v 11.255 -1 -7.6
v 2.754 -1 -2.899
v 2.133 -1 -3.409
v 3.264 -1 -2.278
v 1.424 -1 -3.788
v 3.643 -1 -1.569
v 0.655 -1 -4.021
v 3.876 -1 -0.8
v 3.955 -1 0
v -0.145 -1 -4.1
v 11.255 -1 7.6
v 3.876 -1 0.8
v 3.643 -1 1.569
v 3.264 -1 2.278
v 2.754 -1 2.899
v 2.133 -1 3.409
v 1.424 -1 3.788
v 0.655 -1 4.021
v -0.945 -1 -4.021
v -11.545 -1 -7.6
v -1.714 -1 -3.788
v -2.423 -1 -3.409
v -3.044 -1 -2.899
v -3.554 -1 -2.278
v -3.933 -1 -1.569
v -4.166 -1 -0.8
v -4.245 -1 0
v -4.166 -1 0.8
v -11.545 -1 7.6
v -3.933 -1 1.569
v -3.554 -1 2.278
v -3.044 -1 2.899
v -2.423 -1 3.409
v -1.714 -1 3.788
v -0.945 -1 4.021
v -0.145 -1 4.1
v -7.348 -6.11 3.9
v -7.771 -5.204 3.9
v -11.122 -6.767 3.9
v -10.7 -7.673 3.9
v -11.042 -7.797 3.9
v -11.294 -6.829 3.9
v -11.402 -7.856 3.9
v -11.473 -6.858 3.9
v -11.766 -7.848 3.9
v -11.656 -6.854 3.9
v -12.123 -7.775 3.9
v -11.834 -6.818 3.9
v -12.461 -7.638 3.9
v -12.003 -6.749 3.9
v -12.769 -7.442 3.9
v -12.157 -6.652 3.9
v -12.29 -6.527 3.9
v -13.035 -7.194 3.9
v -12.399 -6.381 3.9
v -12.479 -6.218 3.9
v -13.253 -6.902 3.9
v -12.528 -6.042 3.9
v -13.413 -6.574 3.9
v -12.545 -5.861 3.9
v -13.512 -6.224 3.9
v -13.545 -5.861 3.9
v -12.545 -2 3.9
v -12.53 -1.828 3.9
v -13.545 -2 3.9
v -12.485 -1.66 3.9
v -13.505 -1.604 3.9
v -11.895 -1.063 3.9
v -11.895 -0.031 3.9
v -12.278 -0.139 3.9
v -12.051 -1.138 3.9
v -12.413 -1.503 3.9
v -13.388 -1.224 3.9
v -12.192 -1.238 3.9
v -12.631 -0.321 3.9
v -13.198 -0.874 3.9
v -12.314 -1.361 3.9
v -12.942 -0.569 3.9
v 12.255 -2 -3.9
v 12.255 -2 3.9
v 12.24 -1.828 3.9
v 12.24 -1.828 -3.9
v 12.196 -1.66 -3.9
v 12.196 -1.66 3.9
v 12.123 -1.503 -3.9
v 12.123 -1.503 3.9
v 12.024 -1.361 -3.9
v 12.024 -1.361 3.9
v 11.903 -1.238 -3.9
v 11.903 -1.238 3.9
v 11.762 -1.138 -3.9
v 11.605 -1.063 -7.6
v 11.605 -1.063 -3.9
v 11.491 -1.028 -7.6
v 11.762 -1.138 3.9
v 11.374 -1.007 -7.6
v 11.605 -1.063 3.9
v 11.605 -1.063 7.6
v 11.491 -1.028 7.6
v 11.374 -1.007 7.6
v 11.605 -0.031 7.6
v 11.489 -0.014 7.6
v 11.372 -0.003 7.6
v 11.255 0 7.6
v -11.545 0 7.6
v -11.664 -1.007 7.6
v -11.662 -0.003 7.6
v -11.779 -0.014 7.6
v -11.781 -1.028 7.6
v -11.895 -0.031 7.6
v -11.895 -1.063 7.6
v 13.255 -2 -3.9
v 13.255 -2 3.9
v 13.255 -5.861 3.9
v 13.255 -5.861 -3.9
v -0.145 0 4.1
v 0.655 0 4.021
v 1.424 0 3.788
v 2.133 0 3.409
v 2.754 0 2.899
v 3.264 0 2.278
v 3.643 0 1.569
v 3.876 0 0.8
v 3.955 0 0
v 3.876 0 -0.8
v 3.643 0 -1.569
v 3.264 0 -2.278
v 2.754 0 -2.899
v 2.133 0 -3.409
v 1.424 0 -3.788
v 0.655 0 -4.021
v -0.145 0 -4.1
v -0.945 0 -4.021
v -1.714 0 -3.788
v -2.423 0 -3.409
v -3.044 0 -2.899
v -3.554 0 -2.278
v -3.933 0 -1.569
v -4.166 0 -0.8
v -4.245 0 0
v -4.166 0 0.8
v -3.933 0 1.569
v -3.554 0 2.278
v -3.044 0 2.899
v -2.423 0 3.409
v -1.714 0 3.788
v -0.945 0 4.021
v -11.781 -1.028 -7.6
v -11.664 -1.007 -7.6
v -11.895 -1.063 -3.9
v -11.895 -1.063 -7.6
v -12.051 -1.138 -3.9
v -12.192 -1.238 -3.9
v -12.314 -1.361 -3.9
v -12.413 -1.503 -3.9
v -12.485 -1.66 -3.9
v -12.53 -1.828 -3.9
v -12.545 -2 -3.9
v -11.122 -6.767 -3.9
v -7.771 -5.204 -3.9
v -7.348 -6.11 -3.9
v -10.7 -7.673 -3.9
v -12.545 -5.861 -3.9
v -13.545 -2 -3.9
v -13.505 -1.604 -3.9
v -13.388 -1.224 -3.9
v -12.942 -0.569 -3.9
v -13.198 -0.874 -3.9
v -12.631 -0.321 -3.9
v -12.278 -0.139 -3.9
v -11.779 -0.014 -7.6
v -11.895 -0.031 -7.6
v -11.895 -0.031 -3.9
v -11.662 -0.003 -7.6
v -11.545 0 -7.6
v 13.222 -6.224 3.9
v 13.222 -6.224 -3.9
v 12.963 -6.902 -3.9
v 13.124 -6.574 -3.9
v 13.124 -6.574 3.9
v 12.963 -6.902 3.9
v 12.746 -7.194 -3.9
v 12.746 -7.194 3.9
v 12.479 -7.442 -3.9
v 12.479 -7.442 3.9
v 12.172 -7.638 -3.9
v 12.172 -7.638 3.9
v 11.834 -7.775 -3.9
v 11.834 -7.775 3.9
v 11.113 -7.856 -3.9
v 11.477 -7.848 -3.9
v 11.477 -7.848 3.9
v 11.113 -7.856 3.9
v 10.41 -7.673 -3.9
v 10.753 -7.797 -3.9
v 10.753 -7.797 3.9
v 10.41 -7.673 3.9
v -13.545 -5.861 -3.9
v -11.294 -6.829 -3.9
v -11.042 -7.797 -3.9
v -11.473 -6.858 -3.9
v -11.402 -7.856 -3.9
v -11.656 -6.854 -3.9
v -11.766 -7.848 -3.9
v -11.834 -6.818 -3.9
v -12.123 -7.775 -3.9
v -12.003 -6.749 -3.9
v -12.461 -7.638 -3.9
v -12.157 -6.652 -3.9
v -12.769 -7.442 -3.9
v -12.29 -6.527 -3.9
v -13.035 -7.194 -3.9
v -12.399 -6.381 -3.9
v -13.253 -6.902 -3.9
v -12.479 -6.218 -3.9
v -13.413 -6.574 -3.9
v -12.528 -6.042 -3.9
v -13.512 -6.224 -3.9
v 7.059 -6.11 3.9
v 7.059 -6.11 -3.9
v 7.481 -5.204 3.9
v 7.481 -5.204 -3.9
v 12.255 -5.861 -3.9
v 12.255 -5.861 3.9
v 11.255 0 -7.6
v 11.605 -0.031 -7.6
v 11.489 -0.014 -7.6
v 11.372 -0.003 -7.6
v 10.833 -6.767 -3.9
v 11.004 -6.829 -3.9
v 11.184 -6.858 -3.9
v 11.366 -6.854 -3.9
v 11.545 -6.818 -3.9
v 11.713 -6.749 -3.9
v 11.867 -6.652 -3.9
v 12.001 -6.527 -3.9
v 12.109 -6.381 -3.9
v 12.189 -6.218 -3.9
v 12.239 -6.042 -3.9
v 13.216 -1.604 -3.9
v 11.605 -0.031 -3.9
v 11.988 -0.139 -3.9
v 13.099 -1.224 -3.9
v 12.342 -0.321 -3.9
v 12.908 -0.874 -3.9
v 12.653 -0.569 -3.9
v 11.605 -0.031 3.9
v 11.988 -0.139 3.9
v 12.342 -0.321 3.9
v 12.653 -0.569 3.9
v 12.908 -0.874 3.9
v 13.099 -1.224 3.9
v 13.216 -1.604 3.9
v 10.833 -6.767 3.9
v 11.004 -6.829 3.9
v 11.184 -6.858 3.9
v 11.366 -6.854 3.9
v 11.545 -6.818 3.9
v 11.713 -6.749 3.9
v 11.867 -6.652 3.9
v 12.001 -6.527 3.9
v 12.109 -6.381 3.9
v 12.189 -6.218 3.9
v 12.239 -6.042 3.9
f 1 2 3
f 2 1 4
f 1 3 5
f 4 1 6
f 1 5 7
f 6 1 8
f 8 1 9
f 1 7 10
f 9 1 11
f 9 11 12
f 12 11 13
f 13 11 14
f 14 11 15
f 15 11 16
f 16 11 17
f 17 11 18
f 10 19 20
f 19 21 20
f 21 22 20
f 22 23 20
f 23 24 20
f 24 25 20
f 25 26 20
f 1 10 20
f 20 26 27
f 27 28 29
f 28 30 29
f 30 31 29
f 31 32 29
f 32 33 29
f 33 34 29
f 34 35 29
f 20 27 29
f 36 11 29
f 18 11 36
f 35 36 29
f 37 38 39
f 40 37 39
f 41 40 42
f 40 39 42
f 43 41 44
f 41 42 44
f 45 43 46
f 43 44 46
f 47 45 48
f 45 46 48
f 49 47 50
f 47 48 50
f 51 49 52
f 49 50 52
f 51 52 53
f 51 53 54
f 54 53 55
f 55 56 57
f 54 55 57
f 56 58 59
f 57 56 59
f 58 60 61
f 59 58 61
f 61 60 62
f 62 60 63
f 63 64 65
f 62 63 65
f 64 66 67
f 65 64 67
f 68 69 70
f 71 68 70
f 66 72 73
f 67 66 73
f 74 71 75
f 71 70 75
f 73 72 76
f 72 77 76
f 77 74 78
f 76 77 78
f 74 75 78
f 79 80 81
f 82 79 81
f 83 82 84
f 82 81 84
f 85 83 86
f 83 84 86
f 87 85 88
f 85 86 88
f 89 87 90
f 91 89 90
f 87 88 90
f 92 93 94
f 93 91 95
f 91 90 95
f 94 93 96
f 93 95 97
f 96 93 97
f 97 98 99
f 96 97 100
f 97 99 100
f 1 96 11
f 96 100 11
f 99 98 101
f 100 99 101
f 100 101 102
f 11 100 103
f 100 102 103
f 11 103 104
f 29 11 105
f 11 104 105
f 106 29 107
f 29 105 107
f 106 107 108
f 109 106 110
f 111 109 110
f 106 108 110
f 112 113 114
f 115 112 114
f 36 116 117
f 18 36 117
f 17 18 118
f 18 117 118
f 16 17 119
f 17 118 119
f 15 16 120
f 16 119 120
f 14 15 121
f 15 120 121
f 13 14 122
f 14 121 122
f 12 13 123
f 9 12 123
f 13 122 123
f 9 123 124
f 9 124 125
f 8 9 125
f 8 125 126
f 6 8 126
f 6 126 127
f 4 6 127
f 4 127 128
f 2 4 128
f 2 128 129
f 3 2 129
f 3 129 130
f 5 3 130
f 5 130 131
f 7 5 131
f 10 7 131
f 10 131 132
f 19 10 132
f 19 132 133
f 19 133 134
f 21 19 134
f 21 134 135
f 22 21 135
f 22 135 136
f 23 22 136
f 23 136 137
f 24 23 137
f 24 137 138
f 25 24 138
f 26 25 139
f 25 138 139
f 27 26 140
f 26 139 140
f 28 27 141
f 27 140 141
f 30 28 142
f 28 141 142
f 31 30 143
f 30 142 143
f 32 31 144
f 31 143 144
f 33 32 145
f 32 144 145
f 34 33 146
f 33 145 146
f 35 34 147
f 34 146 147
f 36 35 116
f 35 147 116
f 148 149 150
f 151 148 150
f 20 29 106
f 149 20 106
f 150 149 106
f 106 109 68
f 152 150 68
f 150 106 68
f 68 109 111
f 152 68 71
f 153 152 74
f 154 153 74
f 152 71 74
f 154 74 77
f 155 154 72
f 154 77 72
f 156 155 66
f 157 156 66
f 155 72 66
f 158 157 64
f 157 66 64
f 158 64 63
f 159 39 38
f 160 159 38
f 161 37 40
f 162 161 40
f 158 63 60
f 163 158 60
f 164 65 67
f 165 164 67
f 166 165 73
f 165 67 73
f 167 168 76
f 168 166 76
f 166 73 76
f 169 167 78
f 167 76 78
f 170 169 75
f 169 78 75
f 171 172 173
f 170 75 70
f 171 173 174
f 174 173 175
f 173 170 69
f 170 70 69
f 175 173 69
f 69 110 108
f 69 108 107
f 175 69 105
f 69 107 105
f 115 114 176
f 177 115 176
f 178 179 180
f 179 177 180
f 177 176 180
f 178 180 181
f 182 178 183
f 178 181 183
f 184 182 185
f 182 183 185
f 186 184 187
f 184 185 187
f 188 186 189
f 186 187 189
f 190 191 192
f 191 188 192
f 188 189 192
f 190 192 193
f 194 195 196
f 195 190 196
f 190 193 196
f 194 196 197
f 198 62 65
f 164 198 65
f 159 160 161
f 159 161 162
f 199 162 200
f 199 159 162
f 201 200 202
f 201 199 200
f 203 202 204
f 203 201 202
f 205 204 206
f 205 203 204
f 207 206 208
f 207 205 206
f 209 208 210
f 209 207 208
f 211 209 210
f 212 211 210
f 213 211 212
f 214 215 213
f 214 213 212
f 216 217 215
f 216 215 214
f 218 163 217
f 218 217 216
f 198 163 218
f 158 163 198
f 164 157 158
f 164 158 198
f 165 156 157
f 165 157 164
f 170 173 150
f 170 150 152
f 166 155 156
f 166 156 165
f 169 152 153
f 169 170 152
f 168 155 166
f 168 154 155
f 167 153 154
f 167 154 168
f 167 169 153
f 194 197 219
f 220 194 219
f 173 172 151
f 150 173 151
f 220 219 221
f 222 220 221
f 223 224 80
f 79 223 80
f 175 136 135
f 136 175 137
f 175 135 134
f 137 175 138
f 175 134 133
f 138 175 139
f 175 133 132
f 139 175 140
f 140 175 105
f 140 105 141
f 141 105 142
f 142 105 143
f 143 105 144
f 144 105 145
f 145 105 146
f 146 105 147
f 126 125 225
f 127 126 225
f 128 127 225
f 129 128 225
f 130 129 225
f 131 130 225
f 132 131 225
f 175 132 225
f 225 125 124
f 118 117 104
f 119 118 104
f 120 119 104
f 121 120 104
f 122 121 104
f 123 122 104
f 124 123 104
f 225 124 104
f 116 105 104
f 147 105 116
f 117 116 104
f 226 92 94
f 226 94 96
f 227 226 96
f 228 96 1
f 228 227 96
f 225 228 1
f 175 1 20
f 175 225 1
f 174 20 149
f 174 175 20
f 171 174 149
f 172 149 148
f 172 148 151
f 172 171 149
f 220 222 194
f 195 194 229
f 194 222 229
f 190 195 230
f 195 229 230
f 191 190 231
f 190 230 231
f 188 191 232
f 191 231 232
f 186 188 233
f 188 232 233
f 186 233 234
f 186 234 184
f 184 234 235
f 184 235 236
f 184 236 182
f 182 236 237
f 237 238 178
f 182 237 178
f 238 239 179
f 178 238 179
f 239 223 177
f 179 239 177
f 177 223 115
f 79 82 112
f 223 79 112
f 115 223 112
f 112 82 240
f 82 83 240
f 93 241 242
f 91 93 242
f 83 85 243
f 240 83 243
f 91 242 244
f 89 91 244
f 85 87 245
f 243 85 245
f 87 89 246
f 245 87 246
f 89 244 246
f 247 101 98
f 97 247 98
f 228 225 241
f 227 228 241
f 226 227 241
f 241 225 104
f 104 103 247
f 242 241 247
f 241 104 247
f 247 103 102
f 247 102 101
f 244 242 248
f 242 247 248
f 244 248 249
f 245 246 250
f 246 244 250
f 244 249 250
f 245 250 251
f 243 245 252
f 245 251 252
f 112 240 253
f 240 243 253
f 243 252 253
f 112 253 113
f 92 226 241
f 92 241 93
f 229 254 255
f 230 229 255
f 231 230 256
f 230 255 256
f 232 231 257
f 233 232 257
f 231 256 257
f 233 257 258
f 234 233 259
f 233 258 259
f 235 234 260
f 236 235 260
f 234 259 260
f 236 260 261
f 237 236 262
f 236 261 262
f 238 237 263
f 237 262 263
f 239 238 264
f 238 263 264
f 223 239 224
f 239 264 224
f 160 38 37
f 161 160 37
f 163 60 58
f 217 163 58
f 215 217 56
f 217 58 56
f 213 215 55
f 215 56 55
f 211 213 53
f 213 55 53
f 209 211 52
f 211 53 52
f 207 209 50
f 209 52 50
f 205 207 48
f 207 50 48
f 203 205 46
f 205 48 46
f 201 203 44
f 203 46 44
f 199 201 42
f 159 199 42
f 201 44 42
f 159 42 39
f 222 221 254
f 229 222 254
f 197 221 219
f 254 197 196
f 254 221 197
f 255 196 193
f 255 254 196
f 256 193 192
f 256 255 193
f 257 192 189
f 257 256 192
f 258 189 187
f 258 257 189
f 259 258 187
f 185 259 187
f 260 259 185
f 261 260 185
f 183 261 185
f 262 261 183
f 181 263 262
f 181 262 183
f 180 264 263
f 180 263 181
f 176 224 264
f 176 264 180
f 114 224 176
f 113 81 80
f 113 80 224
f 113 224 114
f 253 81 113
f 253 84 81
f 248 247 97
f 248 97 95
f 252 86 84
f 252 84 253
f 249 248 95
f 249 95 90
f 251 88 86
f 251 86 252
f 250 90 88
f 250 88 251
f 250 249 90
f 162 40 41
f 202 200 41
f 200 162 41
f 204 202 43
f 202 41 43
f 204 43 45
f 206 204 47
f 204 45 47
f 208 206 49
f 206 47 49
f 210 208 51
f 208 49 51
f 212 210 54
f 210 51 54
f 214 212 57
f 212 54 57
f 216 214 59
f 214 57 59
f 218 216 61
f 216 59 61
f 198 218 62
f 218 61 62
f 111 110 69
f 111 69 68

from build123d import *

# Parameters (mm, degrees)
EXTRUDE_1_DEPTH     = 7.6
CUT_EXTRUDE_1_DEPTH = 3.7
SKETCH_5_R          = 4.1
CUT_EXTRUDE_2_DEPTH = 3.7


with BuildPart() as part:
    # 草图1 → 凸台-拉伸1 (new, symmetric)
    with BuildSketch(Plane.XY):
        with BuildLine():
            Line((-7.348183963, -6.11049447), (-10.699512046, -7.67324442))
            ThreePointArc((-10.699512046, -7.67324442), (-12.619347786, -7.547411737), (-13.544748569, -5.860628846))
            Line((-13.544748569, -5.860628846), (-13.544748569, -2))
            ThreePointArc((-13.544748569, -2), (-12.958962131, -0.585786438), (-11.544748569, 0))
            Line((-11.544748569, 0), (11.255251431, 0))
            ThreePointArc((11.255251431, 0), (12.669464993, -0.585786438), (13.255251431, -2))
            Line((13.255251431, -2), (13.255251431, -5.860628846))
            ThreePointArc((13.255251431, -5.860628846), (12.329850648, -7.547411737), (10.410014907, -7.67324442))
            Line((10.410014907, -7.67324442), (7.058686825, -6.11049447))
            Line((7.058686825, -6.11049447), (7.481305087, -5.204186683))
            Line((7.481305087, -5.204186683), (10.832633169, -6.766936633))
            ThreePointArc((10.832633169, -6.766936633), (11.792551039, -6.704020292), (12.255251431, -5.860628846))
            Line((12.255251431, -5.860628846), (12.255251431, -2))
            ThreePointArc((12.255251431, -2), (11.962358212, -1.292893219), (11.255251431, -1))
            Line((11.255251431, -1), (-11.544748569, -1))
            ThreePointArc((-11.544748569, -1), (-12.25185535, -1.292893219), (-12.544748569, -2))
            Line((-12.544748569, -2), (-12.544748569, -5.860628846))
            ThreePointArc((-12.544748569, -5.860628846), (-12.082048177, -6.704020292), (-11.122130307, -6.766936633))
            Line((-11.122130307, -6.766936633), (-7.770802225, -5.204186683))
            Line((-7.770802225, -5.204186683), (-7.348183963, -6.11049447))
        make_face()
    extrude(amount=EXTRUDE_1_DEPTH, both=True)

    # 草图3 → 切除-拉伸1 (cut)
    with BuildSketch(Plane.XY.offset(7.6)):
        Polygon((-11.894748569, -3.292064446), (-5.65074495, -3.292064446), (-5.65074495, -8.789099245), (-21.304410353, -8.789099245), (-21.304410353, 0.944175246), (-11.894748569, 0.944175246), align=None)
        Polygon((5.361247812, -3.292064446), (5.361247812, -8.789099245), (21.014913215, -8.789099245), (21.014913215, 0.944175246), (11.605251431, 0.944175246), (11.605251431, -3.292064446), align=None)
    cut_extrude_1 = extrude(amount=-CUT_EXTRUDE_1_DEPTH, mode=Mode.SUBTRACT)

    # 镜向1: 切除-拉伸1 across plane
    add(cut_extrude_1.mirror(Plane.XY), mode=Mode.SUBTRACT)

    # 草图5 → 切除-拉伸2 (cut)
    with BuildSketch(Plane(origin=(0, 0, 0), x_dir=(1, 0, 0), z_dir=(0, 1, 0))):
        with Locations(Location((-0.144748569, 0, 0), (0, 0, 270))):
            Circle(SKETCH_5_R)
    extrude(amount=-CUT_EXTRUDE_2_DEPTH, mode=Mode.SUBTRACT)


solid = part.part
